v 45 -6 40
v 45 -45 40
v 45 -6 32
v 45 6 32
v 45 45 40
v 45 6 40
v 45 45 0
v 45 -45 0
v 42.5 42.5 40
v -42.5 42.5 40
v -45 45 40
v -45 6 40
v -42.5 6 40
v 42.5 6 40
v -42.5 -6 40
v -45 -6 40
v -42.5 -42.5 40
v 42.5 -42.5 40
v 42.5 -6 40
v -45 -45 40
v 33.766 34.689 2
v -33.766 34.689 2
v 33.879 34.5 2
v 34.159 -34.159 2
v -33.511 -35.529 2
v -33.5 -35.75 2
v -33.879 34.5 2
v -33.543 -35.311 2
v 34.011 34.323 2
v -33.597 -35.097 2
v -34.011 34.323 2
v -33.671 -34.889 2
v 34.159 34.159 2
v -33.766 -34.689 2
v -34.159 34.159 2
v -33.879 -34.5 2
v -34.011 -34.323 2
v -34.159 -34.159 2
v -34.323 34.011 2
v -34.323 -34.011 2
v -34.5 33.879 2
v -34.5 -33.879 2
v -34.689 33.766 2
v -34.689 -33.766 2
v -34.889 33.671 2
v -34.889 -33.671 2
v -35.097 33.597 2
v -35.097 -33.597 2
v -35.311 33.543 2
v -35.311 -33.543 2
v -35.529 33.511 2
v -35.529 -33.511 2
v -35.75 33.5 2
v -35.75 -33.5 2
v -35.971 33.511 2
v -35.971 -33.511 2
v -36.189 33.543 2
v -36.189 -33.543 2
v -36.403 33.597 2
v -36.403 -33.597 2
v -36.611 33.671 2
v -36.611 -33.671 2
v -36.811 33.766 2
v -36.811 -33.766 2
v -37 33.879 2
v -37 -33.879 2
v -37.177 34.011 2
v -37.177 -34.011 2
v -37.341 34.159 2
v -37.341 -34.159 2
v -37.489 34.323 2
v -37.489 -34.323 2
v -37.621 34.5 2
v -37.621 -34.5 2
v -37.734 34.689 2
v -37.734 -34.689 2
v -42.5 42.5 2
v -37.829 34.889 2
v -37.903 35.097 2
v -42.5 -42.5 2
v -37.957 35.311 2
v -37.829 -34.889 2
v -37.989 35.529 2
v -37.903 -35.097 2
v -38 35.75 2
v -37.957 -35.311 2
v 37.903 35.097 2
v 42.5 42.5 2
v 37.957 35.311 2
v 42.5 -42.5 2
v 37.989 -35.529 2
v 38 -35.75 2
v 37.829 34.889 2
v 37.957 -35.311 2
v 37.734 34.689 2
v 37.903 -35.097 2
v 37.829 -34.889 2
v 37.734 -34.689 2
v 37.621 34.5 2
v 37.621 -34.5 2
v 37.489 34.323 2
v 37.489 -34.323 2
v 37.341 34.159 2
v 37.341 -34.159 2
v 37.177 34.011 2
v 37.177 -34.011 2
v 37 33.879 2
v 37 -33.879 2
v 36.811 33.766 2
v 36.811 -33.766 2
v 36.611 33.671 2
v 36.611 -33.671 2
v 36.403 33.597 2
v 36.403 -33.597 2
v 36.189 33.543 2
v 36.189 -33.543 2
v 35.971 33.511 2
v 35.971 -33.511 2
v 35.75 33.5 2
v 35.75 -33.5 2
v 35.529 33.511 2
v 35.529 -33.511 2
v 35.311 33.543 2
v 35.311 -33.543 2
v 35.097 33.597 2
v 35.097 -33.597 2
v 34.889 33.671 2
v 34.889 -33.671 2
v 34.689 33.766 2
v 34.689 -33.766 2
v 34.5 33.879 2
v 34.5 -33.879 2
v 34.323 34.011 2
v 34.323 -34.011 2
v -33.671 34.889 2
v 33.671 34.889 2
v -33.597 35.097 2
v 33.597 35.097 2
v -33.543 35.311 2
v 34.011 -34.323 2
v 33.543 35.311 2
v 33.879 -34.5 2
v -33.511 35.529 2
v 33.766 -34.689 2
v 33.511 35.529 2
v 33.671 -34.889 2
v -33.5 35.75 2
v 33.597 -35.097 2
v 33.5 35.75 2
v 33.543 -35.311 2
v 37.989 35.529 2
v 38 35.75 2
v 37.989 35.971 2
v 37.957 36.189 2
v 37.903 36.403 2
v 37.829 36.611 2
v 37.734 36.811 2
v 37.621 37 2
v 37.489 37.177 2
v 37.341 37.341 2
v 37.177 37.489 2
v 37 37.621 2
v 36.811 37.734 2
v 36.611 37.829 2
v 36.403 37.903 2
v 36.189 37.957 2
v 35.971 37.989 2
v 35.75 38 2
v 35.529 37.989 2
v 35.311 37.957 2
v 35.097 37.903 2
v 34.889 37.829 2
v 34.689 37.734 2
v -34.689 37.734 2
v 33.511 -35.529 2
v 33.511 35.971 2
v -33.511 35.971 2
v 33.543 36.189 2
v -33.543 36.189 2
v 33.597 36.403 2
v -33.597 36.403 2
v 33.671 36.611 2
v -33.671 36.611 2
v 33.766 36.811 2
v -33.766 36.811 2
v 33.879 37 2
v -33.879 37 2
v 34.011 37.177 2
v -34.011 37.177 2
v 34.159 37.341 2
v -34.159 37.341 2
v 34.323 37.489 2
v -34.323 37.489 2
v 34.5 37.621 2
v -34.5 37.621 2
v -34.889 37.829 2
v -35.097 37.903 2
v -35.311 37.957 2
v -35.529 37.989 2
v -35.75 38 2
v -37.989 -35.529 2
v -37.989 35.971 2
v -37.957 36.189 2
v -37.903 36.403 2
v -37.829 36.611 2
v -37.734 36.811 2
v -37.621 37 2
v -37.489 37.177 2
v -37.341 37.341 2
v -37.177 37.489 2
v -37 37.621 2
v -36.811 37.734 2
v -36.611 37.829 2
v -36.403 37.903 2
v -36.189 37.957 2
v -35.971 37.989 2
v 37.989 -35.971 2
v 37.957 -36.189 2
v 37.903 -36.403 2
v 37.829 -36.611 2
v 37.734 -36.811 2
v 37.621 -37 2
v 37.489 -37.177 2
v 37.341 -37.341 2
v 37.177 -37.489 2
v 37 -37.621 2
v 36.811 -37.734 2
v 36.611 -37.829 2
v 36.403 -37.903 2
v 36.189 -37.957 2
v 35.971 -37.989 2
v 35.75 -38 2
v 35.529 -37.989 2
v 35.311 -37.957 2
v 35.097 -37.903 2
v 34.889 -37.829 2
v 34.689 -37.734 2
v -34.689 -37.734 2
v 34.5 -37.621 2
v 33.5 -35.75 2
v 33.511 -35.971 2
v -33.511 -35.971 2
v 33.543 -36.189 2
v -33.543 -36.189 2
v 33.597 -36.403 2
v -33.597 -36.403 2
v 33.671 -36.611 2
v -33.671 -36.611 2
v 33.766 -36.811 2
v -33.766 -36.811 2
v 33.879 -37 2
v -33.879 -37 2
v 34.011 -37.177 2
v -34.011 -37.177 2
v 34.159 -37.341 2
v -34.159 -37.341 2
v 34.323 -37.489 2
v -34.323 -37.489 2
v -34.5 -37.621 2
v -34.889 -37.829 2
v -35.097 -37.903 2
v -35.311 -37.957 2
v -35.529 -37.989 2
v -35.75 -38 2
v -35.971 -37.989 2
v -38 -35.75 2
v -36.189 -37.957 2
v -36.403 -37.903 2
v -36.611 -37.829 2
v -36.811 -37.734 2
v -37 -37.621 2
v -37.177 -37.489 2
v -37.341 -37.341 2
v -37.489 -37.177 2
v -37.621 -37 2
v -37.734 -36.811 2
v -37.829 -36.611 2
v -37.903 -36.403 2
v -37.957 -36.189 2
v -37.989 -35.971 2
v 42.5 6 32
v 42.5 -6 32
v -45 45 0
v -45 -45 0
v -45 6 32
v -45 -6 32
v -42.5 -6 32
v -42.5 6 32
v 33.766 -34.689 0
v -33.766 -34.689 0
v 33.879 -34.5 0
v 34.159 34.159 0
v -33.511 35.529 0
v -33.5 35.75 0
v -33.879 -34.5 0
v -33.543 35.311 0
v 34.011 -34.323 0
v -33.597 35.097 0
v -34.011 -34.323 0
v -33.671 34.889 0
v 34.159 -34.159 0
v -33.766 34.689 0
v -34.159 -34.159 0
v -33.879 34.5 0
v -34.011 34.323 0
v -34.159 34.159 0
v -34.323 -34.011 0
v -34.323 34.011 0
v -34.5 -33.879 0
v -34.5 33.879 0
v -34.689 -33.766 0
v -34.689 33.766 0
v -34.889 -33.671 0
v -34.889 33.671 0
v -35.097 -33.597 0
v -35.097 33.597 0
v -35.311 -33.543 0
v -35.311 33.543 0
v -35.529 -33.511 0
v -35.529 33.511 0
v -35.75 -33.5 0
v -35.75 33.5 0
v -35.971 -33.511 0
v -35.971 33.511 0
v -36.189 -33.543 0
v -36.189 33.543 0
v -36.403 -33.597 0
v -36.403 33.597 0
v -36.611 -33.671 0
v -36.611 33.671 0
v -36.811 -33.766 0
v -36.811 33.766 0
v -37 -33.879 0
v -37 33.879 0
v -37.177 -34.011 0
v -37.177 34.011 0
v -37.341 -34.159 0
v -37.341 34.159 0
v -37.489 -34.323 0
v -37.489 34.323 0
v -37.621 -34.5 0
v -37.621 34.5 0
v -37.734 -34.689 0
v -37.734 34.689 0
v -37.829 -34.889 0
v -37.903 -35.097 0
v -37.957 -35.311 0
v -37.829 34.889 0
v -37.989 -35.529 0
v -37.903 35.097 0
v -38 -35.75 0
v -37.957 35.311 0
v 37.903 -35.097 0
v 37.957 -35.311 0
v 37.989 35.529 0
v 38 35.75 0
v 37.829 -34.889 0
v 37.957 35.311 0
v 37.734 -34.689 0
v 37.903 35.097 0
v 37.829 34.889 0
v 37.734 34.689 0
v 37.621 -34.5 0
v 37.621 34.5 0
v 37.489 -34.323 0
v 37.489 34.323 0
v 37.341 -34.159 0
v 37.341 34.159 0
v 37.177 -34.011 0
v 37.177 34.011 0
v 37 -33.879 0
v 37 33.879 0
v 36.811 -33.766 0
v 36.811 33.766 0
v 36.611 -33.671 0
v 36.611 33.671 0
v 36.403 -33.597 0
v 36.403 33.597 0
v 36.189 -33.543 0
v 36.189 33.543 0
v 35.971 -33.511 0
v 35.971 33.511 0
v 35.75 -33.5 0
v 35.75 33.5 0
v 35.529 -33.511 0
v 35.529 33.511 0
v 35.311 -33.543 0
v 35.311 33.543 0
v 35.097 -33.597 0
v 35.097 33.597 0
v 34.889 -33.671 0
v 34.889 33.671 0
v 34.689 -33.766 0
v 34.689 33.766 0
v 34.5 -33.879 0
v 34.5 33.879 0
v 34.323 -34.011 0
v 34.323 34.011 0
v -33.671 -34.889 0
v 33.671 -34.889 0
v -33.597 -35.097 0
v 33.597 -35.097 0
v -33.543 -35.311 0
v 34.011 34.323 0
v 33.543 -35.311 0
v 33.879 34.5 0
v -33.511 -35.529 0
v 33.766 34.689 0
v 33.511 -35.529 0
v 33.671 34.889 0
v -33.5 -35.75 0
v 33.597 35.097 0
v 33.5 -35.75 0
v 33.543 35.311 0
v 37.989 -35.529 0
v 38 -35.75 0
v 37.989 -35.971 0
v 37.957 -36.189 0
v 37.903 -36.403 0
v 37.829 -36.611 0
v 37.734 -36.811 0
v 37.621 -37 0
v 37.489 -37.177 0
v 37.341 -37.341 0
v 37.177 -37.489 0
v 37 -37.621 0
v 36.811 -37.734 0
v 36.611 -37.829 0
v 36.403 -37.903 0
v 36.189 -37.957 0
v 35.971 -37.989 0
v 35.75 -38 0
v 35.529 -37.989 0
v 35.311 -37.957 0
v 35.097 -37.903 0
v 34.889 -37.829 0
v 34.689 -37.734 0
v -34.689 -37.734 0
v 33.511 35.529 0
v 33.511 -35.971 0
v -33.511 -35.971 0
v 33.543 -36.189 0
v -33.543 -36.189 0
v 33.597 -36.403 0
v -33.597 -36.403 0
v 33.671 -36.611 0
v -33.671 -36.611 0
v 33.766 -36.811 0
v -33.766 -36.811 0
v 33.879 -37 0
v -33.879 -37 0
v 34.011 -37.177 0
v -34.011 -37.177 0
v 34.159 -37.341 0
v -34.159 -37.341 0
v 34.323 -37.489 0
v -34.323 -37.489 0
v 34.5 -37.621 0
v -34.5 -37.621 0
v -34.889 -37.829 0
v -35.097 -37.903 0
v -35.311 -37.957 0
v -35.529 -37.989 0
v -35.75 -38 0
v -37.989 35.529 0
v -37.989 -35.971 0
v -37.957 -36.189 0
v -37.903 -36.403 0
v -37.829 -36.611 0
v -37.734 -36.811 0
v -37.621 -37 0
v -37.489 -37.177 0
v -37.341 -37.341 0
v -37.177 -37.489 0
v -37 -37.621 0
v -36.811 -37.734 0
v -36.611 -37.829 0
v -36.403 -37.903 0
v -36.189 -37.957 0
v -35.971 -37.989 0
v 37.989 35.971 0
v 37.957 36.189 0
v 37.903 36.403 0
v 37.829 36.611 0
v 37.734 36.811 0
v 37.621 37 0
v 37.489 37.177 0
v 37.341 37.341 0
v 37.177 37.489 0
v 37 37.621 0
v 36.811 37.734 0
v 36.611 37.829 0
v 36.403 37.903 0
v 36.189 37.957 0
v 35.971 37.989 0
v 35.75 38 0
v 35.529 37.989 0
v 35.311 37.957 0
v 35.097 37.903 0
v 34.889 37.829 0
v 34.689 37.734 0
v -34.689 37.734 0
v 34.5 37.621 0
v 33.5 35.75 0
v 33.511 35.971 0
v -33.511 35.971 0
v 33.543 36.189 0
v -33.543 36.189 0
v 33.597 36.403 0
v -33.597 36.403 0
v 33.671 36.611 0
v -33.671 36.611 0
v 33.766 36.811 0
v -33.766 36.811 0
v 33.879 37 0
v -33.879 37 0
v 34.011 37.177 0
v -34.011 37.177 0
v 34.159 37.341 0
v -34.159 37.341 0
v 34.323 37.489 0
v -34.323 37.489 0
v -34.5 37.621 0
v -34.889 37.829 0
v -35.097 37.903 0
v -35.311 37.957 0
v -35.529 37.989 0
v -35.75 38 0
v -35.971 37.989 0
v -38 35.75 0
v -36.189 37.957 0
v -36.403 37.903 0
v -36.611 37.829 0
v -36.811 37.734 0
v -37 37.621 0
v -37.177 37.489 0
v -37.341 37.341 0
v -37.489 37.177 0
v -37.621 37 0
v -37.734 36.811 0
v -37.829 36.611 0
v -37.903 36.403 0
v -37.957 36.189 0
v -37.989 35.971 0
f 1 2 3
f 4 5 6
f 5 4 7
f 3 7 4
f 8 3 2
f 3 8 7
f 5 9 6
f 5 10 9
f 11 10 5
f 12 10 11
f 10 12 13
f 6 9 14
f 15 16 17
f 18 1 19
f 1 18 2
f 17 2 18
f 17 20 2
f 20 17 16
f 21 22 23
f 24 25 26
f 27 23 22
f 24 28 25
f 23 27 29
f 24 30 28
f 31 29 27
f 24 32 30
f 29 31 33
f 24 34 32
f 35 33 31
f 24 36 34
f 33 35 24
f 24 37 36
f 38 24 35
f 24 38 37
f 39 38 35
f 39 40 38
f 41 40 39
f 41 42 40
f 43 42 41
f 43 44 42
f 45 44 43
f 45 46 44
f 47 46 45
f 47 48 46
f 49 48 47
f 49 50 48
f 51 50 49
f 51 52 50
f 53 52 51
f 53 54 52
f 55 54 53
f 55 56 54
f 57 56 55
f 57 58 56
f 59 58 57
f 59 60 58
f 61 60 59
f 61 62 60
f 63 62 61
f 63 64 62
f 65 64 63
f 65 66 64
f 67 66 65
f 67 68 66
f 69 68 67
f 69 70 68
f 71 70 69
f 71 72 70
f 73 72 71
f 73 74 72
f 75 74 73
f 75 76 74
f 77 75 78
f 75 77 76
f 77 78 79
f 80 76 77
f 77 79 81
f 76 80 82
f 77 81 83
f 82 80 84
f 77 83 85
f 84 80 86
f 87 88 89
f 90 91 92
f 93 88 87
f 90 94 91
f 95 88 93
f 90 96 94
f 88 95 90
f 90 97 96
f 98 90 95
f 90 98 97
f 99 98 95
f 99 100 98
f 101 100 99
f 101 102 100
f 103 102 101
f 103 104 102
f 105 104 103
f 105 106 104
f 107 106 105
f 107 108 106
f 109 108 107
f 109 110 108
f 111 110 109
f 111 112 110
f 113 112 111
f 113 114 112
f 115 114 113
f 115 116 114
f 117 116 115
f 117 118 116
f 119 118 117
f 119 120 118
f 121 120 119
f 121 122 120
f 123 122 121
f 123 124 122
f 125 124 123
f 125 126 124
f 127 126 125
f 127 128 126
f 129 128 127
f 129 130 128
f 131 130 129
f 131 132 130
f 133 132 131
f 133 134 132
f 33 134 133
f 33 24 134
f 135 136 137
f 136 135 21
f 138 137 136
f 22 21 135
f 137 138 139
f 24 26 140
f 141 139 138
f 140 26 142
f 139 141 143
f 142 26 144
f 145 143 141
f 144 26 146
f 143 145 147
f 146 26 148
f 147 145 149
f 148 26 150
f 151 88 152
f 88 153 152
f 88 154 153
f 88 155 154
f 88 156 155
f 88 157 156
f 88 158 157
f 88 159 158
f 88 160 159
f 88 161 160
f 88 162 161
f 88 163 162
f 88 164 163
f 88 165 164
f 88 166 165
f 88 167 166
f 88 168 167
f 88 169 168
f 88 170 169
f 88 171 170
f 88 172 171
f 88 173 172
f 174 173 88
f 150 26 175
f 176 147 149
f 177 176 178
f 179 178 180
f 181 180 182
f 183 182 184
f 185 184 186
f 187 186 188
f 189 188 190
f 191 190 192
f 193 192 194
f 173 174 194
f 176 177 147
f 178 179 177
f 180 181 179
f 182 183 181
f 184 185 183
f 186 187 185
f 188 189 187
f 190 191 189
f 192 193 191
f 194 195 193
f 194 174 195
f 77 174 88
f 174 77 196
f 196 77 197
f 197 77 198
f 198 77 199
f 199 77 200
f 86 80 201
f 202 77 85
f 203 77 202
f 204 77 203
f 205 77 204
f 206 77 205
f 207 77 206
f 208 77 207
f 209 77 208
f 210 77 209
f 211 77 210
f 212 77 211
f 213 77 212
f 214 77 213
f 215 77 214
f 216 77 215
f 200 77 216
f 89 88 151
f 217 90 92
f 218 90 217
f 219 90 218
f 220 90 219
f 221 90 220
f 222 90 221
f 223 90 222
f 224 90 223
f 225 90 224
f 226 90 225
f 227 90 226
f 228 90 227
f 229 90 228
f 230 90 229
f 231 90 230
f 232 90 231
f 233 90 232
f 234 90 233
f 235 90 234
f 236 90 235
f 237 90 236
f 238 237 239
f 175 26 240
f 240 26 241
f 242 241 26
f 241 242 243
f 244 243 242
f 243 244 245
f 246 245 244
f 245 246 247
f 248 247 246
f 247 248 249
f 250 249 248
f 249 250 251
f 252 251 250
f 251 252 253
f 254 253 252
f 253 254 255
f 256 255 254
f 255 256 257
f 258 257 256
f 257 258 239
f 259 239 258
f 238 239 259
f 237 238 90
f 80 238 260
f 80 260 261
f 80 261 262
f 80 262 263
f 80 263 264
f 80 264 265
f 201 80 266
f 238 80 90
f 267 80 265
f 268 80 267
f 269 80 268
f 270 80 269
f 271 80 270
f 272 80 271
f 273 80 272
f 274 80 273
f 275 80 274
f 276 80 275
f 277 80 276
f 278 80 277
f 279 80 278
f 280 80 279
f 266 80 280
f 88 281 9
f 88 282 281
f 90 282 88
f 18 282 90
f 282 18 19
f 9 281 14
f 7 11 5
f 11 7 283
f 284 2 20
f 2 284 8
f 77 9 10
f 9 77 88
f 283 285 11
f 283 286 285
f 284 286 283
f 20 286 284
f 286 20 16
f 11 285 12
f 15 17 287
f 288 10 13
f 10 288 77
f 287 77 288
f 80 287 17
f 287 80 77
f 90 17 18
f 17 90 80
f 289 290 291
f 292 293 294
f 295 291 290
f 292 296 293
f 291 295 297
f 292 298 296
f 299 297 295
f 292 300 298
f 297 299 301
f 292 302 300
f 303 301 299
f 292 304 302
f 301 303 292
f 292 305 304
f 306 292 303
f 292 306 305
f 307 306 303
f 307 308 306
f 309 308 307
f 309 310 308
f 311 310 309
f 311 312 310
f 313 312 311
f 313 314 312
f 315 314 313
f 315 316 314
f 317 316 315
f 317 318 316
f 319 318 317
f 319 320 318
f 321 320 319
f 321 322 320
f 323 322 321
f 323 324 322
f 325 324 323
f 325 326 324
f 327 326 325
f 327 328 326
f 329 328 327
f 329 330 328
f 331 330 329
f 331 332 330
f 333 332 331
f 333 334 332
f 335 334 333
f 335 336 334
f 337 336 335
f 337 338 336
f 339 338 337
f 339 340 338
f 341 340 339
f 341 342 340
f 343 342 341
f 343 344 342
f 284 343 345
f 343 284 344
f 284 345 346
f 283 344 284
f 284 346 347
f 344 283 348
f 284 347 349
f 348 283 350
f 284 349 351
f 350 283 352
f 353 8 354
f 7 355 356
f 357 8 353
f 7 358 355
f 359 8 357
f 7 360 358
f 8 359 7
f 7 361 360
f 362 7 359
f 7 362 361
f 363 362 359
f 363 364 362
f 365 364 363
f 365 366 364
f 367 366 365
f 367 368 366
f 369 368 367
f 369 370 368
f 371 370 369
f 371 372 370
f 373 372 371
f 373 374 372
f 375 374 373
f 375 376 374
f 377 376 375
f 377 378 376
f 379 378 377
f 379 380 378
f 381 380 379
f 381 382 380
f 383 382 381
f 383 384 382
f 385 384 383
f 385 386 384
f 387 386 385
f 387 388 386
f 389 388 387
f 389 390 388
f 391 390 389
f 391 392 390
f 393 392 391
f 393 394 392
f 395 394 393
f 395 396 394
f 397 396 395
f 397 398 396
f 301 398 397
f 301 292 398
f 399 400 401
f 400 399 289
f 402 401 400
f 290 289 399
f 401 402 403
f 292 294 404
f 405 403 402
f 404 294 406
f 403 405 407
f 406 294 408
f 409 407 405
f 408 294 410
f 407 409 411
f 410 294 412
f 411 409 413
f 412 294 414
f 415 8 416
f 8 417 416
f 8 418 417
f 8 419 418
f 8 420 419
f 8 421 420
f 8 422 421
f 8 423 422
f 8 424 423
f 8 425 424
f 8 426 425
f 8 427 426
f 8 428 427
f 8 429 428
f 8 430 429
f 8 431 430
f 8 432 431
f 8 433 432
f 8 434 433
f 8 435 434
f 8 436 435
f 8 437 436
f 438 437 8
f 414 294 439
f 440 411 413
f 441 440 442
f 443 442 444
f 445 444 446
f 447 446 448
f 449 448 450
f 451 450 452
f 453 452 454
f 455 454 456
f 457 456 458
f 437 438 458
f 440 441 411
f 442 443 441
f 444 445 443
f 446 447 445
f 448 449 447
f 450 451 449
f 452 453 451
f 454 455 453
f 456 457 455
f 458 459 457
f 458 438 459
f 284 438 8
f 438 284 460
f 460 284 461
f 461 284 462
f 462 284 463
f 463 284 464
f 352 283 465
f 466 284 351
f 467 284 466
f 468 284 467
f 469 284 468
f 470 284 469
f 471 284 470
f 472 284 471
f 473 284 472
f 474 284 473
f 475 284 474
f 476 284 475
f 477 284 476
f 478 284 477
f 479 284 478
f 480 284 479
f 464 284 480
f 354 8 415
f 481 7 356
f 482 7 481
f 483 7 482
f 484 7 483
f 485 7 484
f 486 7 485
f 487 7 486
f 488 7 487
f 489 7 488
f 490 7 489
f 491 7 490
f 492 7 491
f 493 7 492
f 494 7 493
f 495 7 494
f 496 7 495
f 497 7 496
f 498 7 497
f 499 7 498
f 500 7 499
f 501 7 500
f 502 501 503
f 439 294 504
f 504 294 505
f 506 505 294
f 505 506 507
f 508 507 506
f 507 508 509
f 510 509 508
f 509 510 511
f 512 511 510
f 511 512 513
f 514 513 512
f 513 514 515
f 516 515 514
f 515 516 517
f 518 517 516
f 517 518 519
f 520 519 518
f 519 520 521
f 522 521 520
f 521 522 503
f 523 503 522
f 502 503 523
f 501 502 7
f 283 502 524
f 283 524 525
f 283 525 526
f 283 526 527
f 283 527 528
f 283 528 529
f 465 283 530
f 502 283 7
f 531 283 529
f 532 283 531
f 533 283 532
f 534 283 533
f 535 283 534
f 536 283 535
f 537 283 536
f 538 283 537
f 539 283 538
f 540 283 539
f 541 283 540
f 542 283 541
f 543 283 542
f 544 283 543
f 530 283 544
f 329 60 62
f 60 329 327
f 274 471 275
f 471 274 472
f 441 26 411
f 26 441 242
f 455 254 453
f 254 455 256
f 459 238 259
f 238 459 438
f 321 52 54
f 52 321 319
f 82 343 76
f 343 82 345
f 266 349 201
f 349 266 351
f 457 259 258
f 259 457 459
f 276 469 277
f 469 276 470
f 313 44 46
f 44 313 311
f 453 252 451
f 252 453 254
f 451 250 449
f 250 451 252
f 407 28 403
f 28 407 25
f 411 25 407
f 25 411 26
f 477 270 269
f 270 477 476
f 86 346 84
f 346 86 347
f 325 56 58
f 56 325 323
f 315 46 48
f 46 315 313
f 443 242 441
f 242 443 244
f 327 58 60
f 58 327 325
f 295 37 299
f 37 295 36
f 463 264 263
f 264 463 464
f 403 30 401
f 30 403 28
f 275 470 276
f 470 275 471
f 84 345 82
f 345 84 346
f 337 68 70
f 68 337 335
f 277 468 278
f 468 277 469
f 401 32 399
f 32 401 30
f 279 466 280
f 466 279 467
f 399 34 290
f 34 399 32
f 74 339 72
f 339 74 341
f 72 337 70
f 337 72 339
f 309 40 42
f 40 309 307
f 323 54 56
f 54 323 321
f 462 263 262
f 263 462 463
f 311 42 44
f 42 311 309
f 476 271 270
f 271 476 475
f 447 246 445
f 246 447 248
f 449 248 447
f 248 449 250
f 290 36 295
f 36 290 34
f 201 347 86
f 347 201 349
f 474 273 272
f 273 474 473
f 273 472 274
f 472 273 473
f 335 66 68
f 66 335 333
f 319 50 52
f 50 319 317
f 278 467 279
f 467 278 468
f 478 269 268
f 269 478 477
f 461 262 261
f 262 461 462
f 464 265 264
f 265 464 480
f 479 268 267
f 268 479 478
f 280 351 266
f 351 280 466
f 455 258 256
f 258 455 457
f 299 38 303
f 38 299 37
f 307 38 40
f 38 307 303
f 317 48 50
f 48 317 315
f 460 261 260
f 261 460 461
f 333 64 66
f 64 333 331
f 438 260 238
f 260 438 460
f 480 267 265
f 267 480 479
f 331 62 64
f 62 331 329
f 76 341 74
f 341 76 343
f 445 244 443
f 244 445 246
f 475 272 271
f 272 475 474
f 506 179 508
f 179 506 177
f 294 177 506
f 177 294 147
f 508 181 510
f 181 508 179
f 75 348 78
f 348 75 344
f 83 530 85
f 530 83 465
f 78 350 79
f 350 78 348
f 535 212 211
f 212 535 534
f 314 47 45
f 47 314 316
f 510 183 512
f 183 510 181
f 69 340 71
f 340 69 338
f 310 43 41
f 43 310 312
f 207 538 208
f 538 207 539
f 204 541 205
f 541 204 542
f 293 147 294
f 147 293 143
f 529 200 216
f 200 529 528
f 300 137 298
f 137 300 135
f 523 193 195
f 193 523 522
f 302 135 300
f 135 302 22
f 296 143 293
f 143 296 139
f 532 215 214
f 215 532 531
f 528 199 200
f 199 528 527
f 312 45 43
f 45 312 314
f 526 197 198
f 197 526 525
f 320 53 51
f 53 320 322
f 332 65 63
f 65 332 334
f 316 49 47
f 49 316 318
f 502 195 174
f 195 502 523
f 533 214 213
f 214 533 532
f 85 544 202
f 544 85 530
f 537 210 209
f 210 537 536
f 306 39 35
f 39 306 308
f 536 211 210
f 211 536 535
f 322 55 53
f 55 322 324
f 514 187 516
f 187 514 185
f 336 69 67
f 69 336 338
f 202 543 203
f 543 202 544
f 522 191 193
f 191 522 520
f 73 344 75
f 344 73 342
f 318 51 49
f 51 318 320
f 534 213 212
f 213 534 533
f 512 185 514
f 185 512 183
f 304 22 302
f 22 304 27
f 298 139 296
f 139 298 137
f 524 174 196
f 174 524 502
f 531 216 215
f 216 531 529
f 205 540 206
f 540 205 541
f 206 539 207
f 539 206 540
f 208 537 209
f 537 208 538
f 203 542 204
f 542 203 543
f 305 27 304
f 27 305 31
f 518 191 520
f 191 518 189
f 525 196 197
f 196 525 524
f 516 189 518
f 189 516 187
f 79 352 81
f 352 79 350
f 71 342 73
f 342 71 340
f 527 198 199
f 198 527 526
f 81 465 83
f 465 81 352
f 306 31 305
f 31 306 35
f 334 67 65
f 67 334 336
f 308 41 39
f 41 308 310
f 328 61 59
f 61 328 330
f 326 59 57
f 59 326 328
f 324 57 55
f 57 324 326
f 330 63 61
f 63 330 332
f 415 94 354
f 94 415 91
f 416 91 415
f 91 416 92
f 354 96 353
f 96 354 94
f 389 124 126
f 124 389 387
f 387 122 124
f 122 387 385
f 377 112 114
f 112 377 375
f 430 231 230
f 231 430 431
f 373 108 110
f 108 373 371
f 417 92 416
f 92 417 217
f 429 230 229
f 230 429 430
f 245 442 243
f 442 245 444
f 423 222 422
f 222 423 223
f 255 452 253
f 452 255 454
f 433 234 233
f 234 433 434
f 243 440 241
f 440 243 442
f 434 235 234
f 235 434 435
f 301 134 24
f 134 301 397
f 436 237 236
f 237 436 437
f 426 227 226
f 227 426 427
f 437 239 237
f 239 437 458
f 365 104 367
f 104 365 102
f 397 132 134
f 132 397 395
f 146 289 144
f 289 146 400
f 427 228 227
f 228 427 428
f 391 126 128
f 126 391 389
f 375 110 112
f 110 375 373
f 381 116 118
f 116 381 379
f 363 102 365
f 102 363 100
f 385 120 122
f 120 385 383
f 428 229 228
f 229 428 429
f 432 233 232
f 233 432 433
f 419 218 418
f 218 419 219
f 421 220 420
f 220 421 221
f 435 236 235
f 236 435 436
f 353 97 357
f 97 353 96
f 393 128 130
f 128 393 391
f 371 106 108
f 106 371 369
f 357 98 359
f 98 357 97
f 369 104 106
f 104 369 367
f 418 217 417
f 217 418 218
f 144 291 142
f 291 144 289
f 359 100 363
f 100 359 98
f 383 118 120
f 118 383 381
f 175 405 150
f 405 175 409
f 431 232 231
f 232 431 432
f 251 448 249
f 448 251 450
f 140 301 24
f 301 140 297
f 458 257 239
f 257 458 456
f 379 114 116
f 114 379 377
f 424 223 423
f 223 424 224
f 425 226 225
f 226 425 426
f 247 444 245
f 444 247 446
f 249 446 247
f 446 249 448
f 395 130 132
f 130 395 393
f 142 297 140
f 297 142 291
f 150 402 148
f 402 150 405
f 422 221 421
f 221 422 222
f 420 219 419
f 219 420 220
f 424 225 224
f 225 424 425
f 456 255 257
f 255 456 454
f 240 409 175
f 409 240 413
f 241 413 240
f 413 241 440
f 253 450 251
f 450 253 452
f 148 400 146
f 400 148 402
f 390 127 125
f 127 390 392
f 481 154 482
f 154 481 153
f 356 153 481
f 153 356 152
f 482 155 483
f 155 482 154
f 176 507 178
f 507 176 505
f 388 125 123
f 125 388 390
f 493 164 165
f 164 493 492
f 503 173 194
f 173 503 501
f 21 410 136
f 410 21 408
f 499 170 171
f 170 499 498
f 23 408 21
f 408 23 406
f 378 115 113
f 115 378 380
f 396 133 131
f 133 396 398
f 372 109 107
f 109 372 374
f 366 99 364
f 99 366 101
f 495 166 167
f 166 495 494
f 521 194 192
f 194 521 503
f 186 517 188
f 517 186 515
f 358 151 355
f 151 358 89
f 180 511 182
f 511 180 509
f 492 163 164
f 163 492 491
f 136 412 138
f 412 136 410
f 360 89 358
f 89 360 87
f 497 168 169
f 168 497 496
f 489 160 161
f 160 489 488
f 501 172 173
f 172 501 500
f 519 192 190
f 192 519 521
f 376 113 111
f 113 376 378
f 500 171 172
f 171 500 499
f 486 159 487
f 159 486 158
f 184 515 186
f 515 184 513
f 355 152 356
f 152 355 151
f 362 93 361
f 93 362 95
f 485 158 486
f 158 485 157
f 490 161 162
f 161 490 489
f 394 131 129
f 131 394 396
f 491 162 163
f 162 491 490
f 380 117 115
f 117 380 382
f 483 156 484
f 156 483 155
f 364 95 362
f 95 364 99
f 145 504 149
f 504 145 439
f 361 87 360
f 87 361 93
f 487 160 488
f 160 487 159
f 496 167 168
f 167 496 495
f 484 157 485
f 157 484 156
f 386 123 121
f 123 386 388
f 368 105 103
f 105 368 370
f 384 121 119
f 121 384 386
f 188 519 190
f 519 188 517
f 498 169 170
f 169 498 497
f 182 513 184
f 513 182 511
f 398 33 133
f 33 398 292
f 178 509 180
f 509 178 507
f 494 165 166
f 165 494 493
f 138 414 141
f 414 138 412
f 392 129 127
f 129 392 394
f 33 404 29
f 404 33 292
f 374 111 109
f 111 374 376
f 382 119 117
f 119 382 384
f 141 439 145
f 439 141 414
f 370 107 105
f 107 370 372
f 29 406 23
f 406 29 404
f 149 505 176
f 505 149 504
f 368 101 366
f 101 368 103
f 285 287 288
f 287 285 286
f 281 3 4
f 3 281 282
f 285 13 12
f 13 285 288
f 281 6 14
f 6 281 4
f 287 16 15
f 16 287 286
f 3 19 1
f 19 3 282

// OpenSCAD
// Magnetic stirrer housing - upside-down open box over an 80 mm PC fan
// Print orientation: top plate on the bed (z = 0), walls rise to z = 40

// ---------- Parameters ----------
plate_t      = 2;     // top plate thickness
wall_t       = 2.5;   // wall thickness
open_top_z   = 40;    // height of the open top
outer_size   = 90;    // outer size in X and Y
hole_d       = 4.5;   // M4 screw hole diameter
hole_pitch   = 71.5;  // screw hole pattern size (square)
notch_w      = 12;    // cable notch width
notch_bottom = 32;    // notch depth from open edge (z = 32 to 40)
eps          = 0.5;   // cutter overshoot past faces

$fn = 64;

// ---------- Model ----------
difference() {
    union() {
        // Top plate
        translate([-outer_size/2, -outer_size/2, 0])
            cube([outer_size, outer_size, plate_t]);

        // Four walls, open at the top
        for (a = [0, 90, 180, 270])
            rotate([0, 0, a])
                translate([outer_size/2 - wall_t, -outer_size/2, plate_t])
                    cube([wall_t, outer_size, open_top_z - plate_t]);
    }

    // Screw holes through the top plate
    for (x = [-hole_pitch/2, hole_pitch/2])
        for (y = [-hole_pitch/2, hole_pitch/2])
            translate([x, y, -eps])
                cylinder(d = hole_d, h = plate_t + 2*eps);

    // Cable notch in one wall (12 mm wide, centred along the wall)
    translate([-outer_size/2, -notch_w/2, notch_bottom])
        cube([outer_size + 2*eps, notch_w, open_top_z - notch_bottom + eps]);
}
